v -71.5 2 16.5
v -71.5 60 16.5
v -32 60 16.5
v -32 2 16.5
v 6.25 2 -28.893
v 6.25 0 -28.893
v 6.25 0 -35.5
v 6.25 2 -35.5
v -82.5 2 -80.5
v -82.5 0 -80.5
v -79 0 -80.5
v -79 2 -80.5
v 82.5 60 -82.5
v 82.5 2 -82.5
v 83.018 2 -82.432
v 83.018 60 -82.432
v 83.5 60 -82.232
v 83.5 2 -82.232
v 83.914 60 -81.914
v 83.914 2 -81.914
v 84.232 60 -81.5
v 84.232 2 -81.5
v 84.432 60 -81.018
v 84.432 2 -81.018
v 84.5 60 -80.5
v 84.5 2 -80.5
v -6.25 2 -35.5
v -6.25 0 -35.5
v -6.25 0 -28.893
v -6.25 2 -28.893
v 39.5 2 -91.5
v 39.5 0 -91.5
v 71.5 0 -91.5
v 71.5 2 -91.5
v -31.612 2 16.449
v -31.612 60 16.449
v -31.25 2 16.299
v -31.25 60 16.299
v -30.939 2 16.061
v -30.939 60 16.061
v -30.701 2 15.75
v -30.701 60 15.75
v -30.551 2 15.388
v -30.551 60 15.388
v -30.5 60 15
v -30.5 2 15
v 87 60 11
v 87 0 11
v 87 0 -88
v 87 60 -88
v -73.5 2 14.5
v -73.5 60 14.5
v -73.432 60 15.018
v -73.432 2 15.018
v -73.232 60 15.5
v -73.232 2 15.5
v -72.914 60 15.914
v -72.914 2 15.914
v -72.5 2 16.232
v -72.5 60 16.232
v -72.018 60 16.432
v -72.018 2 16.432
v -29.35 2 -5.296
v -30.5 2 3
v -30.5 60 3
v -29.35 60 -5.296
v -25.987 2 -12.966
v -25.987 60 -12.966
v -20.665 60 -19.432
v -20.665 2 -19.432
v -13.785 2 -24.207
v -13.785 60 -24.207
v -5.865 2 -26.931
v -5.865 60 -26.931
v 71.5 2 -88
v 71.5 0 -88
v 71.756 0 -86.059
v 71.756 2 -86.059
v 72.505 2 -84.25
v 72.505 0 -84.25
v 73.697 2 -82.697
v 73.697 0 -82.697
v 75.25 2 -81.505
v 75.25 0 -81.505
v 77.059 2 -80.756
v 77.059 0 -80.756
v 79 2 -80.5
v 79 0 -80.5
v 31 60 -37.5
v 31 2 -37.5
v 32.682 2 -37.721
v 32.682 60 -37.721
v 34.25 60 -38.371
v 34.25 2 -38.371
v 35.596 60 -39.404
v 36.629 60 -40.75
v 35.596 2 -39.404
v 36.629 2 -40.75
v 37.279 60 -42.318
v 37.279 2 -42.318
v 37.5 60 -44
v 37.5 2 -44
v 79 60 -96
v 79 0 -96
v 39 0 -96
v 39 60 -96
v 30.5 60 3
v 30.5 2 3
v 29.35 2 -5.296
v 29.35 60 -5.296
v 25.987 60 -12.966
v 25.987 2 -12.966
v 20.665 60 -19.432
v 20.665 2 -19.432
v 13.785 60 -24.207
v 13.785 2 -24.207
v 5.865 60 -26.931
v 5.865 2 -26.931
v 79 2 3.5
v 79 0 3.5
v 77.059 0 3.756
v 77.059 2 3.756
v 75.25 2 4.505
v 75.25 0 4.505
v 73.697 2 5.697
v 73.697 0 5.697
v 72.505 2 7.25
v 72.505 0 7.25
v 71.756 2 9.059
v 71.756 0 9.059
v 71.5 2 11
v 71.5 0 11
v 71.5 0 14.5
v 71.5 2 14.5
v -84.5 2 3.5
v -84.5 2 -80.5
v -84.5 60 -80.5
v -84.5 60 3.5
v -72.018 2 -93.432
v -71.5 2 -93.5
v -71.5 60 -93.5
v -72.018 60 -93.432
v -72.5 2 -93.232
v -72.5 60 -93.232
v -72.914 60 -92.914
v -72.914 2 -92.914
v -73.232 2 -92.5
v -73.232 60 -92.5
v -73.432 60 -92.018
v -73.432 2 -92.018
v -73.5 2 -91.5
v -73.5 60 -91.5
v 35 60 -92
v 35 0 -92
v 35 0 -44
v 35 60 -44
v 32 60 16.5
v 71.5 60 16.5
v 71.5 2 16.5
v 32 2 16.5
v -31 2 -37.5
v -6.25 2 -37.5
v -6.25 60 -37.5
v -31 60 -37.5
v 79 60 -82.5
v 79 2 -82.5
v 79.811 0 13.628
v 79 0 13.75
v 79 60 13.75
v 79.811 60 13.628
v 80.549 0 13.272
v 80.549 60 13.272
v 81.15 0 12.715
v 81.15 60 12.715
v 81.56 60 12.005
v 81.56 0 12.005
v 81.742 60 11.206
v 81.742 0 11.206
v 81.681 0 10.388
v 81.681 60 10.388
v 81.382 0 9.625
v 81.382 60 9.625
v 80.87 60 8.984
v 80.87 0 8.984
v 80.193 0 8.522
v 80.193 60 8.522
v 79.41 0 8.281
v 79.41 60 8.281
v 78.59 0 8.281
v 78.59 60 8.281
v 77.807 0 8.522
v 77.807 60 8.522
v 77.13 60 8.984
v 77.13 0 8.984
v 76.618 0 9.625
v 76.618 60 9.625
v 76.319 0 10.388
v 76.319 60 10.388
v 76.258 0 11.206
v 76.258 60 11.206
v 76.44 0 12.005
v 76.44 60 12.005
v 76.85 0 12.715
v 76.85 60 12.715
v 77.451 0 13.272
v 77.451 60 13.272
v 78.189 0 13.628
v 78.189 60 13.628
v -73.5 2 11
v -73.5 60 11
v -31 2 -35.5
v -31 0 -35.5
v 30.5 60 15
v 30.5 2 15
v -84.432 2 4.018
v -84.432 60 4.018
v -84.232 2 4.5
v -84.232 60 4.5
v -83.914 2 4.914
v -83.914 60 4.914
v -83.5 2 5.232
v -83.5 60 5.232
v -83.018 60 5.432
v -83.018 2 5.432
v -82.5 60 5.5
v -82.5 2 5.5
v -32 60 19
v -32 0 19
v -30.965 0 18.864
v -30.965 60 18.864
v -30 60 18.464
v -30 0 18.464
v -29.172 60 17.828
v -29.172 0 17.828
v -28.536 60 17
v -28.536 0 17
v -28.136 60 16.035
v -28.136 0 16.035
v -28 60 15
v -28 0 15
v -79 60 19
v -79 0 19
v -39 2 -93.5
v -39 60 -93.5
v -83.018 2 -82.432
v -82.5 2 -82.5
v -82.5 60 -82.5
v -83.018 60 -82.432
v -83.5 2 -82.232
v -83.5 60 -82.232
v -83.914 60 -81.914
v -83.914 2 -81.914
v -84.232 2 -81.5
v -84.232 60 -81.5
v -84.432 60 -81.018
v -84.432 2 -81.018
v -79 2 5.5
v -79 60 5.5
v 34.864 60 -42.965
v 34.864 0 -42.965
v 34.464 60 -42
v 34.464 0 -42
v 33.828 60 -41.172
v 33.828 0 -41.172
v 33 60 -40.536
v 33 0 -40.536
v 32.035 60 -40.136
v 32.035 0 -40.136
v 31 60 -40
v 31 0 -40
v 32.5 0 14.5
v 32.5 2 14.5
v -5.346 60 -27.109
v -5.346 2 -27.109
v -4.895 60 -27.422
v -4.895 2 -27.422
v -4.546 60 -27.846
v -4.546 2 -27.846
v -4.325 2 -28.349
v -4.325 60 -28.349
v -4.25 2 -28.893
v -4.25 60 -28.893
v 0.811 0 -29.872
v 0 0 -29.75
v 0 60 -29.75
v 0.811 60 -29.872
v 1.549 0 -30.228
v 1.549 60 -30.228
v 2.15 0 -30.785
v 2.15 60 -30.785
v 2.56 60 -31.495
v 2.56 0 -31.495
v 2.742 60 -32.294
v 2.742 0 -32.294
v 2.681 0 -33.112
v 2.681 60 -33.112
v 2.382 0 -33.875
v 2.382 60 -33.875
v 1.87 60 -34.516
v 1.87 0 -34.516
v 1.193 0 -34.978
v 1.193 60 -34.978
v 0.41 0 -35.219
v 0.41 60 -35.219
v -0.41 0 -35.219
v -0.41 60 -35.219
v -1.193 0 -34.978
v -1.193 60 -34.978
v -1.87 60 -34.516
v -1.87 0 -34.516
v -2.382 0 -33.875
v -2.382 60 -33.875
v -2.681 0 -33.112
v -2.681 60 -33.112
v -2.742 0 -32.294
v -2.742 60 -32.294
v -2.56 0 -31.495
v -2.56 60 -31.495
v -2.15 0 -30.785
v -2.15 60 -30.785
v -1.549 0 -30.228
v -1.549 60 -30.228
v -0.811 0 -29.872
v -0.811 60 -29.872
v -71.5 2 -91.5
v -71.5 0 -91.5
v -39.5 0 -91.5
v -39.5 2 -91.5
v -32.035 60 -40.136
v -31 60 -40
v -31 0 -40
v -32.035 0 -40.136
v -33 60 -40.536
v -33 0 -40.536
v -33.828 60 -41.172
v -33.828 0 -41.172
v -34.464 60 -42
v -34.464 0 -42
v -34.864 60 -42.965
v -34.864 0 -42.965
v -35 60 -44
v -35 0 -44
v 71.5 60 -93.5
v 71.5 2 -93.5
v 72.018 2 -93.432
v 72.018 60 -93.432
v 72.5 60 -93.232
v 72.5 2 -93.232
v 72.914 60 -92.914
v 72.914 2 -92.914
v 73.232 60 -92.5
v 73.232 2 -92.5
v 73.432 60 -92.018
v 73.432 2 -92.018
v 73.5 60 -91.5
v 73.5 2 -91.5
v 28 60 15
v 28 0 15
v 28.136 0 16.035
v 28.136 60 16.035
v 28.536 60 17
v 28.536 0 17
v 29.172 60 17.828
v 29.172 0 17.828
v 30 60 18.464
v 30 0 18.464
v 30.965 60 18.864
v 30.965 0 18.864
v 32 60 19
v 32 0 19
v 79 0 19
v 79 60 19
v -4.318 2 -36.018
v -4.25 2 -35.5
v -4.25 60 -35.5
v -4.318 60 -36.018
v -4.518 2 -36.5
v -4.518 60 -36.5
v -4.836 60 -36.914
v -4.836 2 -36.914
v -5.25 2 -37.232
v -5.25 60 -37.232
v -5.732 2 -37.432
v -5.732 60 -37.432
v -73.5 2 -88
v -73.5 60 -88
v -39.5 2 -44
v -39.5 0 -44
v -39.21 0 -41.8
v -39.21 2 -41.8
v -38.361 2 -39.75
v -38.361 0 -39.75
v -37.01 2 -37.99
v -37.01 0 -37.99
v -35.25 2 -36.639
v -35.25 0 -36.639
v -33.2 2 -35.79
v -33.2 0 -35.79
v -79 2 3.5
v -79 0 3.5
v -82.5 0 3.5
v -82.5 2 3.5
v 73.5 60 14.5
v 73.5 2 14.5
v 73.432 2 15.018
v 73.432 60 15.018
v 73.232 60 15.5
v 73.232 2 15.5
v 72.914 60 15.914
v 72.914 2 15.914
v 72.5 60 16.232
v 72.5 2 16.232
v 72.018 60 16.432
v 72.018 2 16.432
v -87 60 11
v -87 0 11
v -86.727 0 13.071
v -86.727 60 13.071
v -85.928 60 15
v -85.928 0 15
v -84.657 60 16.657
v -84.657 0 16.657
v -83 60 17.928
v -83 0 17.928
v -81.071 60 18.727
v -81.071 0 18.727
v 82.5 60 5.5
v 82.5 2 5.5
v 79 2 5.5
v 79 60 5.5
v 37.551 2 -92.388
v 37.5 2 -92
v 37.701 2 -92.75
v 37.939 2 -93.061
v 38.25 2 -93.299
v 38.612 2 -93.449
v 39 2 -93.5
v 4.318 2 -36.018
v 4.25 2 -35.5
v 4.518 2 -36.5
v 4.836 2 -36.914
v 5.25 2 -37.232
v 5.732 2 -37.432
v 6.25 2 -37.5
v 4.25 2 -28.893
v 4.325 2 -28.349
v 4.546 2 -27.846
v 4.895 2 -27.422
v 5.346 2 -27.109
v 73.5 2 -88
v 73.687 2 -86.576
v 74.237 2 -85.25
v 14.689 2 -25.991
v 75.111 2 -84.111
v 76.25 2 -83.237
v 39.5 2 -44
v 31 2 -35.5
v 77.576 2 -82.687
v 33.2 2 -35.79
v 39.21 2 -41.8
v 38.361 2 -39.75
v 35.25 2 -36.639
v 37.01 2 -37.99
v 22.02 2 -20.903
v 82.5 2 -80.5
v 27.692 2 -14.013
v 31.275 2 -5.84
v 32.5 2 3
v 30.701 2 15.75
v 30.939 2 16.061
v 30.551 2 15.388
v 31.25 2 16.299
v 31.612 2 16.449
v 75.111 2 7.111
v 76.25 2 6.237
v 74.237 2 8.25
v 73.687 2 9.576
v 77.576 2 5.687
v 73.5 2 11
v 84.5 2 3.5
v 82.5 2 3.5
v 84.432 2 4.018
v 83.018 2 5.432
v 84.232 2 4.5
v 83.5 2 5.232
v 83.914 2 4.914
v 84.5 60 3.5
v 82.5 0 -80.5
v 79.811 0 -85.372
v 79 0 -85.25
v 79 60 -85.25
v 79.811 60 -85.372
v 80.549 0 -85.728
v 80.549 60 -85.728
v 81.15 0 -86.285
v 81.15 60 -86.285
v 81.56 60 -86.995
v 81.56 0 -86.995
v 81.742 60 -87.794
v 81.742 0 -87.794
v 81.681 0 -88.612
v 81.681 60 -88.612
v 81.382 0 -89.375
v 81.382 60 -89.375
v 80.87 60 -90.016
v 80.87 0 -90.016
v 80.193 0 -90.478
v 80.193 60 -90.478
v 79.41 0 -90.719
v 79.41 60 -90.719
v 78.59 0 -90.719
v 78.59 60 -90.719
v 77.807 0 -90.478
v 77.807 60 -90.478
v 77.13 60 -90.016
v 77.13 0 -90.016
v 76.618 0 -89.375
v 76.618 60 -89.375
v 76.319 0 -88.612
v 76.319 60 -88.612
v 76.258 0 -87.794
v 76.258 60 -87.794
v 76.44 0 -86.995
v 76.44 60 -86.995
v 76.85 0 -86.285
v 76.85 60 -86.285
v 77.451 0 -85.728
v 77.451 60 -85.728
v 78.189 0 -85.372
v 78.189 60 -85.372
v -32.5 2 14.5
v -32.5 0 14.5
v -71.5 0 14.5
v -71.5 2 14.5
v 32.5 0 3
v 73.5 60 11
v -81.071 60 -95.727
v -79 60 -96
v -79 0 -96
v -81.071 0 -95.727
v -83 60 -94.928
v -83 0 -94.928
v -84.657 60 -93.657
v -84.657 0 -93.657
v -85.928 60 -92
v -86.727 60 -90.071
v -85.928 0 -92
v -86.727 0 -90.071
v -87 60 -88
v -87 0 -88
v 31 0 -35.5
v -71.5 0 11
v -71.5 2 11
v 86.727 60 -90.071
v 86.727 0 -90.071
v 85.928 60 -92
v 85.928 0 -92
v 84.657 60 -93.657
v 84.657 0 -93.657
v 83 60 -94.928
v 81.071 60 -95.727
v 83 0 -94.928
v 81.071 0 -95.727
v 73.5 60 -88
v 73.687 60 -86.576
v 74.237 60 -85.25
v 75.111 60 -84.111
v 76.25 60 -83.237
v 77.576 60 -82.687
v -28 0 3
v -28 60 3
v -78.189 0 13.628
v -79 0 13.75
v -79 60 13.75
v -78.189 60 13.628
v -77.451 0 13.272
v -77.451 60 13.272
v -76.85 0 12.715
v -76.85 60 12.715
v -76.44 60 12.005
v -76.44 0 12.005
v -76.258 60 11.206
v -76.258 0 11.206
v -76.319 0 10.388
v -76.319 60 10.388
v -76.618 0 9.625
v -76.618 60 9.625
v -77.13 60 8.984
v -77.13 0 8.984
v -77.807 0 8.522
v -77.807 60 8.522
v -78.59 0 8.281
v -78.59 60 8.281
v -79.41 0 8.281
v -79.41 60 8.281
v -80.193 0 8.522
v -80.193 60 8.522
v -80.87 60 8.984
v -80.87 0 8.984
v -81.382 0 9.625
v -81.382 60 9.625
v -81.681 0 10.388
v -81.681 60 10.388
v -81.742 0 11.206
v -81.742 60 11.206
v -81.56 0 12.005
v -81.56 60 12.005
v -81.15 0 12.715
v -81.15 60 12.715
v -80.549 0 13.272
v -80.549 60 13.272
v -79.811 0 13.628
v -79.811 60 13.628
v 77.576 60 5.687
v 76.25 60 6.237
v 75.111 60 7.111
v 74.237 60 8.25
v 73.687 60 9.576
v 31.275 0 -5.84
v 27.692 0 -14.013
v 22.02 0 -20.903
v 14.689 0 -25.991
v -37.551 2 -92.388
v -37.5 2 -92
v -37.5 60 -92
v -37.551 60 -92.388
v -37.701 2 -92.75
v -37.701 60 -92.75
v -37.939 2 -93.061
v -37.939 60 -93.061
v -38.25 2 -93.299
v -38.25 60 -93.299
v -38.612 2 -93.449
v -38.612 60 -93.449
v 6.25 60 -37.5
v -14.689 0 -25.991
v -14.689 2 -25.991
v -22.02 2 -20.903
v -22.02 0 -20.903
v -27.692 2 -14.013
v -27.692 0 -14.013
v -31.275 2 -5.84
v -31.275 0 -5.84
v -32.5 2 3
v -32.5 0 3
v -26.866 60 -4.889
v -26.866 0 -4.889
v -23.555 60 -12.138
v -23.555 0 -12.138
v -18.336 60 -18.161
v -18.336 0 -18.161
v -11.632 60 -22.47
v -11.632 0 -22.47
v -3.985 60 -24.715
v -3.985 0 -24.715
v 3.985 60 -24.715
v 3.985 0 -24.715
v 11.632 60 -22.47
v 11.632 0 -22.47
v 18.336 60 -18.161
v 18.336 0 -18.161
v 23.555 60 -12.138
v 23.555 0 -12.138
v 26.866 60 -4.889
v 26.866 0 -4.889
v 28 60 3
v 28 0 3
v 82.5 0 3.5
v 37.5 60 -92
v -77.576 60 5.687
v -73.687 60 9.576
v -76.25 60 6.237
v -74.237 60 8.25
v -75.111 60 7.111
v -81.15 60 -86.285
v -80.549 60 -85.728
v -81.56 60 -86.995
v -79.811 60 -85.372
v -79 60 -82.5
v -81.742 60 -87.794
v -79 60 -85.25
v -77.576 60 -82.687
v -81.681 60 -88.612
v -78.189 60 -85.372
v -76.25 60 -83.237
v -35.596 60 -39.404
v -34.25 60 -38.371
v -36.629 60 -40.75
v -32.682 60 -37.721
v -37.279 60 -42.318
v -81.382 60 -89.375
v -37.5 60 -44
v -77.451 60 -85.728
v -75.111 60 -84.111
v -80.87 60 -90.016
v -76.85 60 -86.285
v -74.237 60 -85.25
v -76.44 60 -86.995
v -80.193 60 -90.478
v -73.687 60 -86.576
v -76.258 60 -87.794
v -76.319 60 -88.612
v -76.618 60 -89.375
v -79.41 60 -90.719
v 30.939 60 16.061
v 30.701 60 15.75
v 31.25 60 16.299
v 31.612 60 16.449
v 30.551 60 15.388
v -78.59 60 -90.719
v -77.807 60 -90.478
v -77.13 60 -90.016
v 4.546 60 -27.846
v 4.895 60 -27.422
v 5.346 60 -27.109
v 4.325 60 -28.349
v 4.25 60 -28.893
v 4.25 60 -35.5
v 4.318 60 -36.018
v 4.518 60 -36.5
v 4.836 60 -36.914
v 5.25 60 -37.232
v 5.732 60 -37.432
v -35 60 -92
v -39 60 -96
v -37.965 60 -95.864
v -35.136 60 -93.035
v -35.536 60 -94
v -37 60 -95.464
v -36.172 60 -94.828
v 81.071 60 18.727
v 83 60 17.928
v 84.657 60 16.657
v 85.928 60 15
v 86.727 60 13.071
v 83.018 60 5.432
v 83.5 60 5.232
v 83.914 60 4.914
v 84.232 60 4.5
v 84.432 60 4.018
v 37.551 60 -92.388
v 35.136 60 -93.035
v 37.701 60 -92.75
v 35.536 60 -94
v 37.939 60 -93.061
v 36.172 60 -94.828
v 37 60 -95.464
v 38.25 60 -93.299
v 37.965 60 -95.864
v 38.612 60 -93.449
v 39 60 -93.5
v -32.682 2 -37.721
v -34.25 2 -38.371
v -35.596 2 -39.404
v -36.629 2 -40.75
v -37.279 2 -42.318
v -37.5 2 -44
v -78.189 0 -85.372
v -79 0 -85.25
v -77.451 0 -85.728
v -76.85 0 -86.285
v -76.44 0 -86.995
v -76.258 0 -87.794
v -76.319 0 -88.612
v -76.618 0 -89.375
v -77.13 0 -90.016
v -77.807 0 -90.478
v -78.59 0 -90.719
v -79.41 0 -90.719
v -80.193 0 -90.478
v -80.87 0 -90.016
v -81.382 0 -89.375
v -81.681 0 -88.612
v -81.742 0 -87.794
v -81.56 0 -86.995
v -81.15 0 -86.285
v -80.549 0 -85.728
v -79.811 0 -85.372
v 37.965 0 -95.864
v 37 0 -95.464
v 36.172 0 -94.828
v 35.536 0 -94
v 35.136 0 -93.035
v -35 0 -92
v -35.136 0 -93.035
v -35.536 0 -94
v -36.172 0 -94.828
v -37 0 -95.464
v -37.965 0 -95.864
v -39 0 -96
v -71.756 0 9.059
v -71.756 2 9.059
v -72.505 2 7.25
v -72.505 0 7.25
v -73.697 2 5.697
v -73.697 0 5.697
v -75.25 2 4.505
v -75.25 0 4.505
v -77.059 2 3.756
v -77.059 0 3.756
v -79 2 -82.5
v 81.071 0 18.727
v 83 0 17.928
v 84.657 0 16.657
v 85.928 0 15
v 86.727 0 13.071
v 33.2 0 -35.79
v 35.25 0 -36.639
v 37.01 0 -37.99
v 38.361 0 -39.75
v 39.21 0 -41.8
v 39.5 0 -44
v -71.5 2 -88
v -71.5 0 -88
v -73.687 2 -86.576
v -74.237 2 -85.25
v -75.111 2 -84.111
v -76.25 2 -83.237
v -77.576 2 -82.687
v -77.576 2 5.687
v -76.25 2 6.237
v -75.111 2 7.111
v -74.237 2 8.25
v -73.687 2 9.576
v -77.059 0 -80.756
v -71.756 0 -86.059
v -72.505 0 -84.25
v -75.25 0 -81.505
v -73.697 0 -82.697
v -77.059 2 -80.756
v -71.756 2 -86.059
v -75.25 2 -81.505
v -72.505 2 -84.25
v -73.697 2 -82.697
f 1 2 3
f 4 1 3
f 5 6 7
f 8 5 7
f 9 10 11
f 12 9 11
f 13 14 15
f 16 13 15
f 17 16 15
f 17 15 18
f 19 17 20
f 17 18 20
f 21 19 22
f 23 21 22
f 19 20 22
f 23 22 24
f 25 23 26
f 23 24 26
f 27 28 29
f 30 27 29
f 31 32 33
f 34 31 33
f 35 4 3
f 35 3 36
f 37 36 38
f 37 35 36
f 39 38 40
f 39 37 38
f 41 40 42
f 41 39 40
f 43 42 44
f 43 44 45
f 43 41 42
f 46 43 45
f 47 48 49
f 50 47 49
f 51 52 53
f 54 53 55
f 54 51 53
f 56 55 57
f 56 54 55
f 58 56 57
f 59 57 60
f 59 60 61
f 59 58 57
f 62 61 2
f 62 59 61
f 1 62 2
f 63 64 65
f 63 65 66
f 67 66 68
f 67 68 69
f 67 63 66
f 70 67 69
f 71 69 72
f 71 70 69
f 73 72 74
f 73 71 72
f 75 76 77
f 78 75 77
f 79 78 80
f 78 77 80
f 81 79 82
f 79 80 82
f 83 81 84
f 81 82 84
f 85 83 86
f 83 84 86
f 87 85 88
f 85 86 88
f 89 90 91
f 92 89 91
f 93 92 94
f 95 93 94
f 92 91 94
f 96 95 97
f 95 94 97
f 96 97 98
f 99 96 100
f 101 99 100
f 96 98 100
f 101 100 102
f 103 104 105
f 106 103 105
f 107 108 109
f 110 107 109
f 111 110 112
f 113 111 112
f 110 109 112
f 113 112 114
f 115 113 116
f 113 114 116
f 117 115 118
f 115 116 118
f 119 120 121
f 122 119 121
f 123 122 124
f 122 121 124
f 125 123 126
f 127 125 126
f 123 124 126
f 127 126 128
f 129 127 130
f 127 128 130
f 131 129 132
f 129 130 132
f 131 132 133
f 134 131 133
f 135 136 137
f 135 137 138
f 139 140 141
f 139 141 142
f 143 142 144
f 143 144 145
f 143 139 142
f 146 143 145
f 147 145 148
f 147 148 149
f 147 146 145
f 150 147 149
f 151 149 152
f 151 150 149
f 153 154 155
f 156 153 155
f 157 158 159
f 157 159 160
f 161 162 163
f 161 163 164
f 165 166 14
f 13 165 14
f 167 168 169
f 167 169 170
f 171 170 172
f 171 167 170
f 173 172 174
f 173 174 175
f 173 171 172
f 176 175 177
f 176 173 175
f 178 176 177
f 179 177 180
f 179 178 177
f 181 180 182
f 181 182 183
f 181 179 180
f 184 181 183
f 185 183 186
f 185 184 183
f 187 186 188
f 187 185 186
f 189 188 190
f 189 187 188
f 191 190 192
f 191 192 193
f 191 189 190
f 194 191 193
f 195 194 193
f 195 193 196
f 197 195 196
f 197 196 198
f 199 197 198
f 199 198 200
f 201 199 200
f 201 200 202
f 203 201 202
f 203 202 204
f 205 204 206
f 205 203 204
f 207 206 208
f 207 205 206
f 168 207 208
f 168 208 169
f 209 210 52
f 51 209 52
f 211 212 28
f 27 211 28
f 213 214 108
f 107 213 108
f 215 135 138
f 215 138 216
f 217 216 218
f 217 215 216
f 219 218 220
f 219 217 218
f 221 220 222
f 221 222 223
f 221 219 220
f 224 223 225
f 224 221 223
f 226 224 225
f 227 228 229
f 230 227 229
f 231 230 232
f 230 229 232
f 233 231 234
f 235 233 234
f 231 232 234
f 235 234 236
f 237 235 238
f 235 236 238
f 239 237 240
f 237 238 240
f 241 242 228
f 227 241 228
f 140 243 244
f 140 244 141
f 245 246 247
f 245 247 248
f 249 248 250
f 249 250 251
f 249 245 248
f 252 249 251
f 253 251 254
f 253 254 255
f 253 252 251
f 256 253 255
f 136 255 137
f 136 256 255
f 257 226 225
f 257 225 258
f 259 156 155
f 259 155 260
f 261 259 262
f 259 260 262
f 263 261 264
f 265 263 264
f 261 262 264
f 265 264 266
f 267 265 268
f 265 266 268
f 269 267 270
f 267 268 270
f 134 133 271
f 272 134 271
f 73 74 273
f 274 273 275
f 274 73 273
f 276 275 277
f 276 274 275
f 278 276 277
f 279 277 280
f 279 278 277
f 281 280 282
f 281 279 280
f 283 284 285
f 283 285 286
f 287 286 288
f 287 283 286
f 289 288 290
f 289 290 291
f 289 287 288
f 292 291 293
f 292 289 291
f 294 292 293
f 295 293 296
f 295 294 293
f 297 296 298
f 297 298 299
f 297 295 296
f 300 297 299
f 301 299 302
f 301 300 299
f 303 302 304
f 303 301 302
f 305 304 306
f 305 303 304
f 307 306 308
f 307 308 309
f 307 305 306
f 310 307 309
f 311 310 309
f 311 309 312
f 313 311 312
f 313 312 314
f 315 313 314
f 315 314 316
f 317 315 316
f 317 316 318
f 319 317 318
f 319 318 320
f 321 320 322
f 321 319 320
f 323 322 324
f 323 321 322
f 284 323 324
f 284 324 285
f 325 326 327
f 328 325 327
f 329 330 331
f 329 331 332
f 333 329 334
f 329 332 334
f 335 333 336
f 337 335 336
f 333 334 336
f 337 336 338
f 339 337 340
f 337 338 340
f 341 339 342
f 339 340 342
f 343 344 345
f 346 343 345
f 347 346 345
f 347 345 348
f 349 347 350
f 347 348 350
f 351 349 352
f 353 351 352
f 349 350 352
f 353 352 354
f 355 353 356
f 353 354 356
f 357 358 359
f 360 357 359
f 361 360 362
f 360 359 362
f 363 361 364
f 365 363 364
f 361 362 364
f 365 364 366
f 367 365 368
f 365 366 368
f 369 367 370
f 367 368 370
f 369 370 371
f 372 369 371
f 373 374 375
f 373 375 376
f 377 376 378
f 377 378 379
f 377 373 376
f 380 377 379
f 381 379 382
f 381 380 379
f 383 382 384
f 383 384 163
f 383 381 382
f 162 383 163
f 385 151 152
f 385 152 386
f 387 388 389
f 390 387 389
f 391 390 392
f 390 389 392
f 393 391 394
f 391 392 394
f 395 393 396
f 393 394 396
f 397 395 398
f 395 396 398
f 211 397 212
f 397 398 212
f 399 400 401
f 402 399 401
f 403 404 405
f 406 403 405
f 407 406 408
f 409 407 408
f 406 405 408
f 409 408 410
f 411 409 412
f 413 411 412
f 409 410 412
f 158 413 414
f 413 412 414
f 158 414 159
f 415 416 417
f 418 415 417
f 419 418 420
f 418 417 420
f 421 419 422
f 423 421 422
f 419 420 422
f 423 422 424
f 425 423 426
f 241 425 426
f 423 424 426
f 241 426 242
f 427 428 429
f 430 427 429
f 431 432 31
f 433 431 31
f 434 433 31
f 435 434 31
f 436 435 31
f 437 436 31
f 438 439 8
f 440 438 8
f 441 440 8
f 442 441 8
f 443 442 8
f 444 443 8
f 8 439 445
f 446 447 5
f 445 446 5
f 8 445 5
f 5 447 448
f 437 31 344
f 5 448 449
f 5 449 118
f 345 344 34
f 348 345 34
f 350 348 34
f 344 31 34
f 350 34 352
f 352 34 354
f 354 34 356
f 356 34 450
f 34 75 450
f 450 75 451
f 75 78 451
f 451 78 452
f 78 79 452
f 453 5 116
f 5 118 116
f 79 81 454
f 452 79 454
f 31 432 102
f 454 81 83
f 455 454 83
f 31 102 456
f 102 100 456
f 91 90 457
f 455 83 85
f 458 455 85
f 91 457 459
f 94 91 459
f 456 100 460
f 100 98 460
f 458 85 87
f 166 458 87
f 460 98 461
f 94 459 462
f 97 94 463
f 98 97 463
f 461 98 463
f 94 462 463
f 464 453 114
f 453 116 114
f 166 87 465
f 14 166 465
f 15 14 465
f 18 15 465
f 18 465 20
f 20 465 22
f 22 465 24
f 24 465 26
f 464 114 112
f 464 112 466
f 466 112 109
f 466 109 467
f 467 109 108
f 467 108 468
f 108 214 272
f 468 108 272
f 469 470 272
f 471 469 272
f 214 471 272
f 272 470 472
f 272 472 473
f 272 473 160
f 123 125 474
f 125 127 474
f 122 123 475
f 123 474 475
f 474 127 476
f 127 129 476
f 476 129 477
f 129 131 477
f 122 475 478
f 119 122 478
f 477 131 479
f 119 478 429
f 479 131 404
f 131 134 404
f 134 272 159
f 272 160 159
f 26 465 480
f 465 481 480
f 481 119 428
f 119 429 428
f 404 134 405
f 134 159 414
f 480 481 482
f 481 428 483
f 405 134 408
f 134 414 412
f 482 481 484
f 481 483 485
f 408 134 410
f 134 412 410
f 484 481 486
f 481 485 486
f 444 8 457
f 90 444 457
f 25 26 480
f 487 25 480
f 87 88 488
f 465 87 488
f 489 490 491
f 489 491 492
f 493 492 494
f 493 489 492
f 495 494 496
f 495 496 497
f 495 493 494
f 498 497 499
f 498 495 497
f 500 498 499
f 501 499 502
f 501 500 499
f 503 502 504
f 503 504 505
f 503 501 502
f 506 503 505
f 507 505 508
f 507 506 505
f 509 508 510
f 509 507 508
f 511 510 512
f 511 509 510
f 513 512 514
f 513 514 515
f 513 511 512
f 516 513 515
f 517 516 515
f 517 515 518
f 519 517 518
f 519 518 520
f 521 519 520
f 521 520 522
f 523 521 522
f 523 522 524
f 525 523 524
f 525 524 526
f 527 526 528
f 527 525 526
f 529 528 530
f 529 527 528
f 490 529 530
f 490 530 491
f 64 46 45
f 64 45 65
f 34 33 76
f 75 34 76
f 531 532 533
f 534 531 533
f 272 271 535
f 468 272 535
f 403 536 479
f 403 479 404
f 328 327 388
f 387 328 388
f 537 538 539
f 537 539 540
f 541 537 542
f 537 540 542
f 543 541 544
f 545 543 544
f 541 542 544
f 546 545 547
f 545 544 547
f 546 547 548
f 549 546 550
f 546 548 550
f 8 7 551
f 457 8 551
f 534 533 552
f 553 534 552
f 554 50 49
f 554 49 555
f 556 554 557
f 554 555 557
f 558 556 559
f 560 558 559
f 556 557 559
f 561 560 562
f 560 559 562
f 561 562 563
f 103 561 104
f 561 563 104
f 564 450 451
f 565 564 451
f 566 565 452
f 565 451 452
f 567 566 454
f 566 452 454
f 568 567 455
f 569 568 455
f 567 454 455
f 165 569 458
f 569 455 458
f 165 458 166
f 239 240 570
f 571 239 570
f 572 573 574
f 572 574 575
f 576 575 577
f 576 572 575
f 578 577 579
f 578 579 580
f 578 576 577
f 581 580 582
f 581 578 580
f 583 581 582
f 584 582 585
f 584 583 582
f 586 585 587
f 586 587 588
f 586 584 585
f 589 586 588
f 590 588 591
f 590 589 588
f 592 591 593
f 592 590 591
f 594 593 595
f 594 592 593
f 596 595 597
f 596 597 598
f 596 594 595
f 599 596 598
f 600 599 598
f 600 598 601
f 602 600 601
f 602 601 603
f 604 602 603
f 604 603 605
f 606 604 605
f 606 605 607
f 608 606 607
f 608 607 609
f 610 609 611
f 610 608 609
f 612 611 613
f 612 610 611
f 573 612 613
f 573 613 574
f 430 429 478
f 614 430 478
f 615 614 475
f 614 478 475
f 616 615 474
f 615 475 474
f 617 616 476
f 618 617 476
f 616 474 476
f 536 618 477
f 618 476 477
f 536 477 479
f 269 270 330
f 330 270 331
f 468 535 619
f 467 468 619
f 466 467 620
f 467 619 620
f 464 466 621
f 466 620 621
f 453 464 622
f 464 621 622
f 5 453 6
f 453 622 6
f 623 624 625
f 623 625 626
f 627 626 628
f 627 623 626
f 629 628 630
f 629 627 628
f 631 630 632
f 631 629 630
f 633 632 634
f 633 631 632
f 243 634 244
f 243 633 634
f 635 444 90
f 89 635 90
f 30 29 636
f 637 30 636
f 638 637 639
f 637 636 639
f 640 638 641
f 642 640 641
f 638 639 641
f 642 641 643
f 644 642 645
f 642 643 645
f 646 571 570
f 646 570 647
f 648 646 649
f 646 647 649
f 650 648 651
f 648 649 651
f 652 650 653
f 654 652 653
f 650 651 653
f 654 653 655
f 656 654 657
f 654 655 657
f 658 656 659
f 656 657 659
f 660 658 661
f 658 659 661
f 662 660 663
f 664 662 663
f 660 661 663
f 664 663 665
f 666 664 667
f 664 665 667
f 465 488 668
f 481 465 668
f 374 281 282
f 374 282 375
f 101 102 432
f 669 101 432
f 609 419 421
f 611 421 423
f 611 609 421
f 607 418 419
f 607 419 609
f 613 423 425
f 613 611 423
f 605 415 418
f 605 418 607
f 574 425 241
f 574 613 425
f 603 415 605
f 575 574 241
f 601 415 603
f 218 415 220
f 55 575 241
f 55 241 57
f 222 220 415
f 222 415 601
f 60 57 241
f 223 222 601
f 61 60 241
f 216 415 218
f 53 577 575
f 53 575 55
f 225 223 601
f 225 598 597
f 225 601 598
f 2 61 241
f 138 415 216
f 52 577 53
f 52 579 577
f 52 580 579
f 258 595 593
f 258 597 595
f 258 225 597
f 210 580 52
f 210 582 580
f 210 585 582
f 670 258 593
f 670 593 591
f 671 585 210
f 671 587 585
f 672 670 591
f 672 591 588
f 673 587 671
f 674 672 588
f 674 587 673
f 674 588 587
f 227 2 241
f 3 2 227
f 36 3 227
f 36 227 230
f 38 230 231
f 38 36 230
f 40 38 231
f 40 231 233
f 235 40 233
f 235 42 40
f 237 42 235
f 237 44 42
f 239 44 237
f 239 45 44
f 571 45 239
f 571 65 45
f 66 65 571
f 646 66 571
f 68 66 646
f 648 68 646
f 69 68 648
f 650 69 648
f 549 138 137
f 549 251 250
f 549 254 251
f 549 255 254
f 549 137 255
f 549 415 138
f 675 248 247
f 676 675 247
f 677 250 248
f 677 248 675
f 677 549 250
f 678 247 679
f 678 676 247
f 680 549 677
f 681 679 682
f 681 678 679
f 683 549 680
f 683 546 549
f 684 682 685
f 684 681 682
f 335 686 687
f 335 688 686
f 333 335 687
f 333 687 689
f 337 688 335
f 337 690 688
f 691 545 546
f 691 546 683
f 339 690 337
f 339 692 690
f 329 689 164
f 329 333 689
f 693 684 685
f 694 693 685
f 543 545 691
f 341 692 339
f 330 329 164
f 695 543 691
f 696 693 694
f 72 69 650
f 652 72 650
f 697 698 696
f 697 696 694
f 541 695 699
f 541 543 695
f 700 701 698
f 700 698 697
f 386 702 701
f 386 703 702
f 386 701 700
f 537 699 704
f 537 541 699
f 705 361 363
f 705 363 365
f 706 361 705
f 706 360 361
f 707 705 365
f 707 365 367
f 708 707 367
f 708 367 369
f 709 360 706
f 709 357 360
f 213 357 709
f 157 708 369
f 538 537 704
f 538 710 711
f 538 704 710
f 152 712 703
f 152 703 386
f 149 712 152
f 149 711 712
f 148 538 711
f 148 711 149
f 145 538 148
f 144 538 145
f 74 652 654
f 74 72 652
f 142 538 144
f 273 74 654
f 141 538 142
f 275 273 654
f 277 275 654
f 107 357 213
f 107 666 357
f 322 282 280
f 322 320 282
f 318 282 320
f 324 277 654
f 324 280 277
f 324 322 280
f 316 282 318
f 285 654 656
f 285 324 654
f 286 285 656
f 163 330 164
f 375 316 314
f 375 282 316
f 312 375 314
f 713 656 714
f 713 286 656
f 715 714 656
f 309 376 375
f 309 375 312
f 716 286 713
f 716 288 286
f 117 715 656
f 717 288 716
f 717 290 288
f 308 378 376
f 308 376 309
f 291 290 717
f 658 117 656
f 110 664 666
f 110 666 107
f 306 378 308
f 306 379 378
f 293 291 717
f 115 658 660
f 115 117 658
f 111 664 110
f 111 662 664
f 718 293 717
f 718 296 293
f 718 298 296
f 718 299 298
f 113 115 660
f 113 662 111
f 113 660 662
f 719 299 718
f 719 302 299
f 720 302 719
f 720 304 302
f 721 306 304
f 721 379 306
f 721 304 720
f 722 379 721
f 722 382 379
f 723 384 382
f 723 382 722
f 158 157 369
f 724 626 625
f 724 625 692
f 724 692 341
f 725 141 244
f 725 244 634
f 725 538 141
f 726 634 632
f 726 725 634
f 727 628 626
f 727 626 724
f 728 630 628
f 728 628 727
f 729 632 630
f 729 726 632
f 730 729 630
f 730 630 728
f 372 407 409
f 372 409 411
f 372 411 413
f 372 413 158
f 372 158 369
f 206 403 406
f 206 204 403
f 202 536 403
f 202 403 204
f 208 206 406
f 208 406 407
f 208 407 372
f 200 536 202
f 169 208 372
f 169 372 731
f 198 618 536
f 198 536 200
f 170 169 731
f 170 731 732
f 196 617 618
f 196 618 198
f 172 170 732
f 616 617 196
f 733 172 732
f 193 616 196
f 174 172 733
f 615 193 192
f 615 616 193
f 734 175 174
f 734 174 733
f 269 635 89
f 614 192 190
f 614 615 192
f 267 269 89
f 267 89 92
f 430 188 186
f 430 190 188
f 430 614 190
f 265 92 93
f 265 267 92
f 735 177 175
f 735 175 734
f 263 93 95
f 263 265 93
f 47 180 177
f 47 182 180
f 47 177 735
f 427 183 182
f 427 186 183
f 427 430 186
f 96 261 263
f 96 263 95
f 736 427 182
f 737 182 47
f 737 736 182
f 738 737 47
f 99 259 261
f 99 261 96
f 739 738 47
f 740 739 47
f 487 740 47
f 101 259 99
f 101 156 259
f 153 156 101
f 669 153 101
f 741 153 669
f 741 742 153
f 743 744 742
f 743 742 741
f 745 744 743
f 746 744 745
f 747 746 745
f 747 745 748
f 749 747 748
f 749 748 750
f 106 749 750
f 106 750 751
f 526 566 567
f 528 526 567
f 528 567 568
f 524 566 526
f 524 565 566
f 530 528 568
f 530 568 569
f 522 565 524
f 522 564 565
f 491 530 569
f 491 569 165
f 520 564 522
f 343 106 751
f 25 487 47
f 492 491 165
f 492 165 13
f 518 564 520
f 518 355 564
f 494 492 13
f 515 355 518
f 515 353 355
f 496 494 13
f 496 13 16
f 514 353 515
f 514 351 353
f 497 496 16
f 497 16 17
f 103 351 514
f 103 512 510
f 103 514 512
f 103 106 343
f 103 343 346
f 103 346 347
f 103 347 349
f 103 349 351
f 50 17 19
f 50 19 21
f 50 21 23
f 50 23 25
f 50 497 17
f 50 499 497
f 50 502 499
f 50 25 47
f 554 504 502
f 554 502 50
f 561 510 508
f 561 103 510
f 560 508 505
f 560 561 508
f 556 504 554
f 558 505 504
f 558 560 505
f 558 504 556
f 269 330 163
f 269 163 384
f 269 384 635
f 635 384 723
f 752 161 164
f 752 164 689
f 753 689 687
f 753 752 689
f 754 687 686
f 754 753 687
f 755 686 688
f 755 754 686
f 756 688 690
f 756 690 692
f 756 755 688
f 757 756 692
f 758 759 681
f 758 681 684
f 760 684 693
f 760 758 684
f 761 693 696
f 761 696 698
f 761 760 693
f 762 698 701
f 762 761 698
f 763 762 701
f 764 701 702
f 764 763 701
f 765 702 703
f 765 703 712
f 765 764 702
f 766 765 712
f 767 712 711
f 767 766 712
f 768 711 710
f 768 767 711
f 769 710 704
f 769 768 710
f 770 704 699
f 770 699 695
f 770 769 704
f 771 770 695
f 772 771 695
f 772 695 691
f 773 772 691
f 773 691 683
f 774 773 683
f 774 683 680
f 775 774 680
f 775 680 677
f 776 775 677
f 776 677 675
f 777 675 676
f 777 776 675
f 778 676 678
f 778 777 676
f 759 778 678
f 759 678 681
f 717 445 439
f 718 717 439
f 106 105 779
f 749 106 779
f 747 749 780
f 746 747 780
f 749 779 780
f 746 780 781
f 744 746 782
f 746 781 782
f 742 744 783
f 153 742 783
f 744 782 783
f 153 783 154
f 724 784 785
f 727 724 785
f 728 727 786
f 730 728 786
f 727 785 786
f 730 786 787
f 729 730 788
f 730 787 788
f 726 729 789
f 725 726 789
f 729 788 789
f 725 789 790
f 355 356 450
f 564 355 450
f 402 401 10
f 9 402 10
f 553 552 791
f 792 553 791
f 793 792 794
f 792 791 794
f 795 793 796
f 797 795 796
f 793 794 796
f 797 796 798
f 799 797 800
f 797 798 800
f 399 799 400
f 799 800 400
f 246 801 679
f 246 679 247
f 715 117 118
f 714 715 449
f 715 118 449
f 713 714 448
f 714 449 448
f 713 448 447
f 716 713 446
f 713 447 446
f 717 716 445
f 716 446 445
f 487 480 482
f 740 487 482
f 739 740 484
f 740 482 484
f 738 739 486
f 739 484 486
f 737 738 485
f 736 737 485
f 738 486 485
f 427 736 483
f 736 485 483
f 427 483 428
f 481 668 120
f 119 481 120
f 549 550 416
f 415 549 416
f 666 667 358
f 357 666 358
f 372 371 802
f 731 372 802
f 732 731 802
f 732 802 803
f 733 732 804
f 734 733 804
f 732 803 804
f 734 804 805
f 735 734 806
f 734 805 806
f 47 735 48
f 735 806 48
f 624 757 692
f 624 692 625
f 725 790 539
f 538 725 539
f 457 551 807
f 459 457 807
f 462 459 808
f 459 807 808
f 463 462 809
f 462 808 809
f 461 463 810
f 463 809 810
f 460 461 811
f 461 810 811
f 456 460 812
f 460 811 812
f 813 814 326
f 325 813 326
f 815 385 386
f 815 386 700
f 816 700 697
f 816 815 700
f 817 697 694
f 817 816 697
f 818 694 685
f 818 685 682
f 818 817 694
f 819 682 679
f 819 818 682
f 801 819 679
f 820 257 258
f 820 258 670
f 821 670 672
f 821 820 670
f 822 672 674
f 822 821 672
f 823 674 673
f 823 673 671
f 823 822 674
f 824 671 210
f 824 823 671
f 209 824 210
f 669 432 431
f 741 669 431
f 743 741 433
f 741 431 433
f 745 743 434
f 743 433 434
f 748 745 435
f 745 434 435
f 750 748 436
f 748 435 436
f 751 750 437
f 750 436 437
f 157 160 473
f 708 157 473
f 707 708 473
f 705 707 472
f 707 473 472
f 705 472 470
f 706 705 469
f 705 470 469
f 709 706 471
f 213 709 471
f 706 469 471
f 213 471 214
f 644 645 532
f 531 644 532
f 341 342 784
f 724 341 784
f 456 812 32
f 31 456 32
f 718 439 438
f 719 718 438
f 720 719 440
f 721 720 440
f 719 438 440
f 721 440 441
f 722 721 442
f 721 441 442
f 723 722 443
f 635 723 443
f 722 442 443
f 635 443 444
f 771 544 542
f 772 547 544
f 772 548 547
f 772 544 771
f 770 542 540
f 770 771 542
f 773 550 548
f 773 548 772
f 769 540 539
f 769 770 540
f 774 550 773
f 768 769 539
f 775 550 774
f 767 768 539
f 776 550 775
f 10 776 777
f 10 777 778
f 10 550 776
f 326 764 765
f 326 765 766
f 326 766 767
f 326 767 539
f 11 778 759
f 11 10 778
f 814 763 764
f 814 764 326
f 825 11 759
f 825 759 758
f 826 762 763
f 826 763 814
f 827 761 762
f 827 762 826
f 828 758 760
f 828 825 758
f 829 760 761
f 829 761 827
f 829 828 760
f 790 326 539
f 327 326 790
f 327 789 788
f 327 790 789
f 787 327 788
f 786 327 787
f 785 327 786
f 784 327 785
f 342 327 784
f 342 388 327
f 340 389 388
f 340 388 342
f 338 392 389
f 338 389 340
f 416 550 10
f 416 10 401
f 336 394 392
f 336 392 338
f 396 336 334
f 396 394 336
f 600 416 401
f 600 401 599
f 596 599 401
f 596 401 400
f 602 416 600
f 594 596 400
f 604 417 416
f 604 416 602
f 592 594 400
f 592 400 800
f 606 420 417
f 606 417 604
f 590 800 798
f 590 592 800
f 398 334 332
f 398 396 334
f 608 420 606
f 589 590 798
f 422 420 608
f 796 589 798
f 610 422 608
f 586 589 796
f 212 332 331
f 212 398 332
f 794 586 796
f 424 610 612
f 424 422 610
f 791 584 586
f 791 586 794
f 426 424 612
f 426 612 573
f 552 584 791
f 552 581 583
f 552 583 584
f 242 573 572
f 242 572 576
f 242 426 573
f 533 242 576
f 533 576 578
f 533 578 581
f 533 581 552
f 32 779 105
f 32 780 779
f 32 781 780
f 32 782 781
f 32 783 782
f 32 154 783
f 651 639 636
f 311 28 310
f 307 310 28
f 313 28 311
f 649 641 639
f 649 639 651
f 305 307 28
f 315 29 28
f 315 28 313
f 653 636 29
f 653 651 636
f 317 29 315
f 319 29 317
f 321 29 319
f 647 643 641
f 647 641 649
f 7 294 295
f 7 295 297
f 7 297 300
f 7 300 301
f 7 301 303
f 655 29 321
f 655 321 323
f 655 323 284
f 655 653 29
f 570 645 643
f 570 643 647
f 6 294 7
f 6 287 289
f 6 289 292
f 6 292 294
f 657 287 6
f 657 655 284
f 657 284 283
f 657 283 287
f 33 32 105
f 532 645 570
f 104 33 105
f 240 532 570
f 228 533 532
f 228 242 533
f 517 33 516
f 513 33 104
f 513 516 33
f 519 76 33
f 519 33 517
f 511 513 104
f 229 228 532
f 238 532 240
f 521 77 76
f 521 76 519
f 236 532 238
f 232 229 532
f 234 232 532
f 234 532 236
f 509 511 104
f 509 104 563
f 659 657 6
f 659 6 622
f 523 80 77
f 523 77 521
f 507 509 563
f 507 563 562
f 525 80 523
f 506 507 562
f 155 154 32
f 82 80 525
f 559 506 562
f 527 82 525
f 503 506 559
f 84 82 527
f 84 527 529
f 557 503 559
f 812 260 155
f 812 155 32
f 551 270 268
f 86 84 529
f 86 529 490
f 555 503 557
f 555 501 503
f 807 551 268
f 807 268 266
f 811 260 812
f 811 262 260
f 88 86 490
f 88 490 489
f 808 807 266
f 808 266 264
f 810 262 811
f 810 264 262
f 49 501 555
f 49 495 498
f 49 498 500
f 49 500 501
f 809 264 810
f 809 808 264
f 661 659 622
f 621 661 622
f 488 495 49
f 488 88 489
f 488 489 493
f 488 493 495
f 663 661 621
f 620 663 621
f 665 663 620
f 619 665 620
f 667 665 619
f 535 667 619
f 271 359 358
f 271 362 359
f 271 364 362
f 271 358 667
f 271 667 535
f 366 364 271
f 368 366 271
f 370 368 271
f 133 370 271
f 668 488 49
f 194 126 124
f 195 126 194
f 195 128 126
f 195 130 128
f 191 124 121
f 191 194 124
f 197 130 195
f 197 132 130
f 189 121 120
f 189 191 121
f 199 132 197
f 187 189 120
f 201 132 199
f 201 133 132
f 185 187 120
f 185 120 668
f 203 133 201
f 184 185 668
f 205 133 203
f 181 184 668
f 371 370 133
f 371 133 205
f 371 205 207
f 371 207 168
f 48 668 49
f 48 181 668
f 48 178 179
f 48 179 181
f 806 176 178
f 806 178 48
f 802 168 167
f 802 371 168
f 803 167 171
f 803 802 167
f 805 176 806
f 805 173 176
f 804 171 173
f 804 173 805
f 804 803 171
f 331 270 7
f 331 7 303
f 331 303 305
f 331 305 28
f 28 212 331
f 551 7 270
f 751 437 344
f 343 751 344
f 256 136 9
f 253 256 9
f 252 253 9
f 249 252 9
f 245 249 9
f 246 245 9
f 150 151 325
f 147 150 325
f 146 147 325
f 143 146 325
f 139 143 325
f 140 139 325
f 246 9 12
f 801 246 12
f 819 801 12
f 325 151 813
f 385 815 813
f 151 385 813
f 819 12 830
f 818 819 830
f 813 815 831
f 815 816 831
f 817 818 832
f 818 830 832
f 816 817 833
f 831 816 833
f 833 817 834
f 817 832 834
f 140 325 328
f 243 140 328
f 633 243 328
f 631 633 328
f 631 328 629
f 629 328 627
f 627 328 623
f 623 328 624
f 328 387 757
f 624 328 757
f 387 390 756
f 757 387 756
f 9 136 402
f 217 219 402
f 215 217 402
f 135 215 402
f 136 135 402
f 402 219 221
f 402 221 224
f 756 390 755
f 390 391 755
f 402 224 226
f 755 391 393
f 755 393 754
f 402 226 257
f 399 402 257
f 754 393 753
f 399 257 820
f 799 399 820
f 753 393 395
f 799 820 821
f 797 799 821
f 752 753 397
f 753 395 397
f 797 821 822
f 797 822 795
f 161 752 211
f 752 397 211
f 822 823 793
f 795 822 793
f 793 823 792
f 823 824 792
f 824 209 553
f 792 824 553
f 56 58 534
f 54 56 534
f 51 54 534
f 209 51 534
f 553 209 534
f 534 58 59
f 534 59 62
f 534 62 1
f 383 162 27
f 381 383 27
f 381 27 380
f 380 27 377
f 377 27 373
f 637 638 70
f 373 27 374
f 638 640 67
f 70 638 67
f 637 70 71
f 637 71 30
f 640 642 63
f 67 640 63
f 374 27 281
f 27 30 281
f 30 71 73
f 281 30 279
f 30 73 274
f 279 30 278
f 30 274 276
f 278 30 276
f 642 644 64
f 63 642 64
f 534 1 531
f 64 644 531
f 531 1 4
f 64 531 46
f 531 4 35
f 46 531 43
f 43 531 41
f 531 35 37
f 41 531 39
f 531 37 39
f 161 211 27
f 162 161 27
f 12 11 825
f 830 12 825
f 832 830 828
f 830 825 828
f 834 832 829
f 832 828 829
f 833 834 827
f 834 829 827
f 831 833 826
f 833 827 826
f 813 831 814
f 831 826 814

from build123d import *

# Parameters (mm, degrees)
SKETCH2_R           = 2.75
BOSS_EXTRUDE1_DEPTH = 60
BOSS_EXTRUDE2_DEPTH = 2


with BuildPart() as part:
    # Sketch2 → Boss-Extrude1 (new body)
    with BuildSketch(Plane(origin=(0, 0, 0), x_dir=(1, 0, 0), z_dir=(0, 1, 0))):
        with BuildLine():
            Line((87, -11), (87, 88))
            ThreePointArc((87, 88), (84.656854249, 93.656854249), (79, 96))
            Line((79, 96), (39, 96))
            ThreePointArc((39, 96), (36.171572875, 94.828427125), (35, 92))
            Line((35, 92), (35, 44))
            ThreePointArc((35, 44), (33.828427125, 41.171572875), (31, 40))
            Line((31, 40), (-31, 40))
            ThreePointArc((-31, 40), (-33.828427125, 41.171572875), (-35, 44))
            Line((-35, 44), (-35, 92))
            ThreePointArc((-35, 92), (-36.171572875, 94.828427125), (-39, 96))
            Line((-39, 96), (-79, 96))
            ThreePointArc((-79, 96), (-84.656854249, 93.656854249), (-87, 88))
            Line((-87, 88), (-87, -11))
            ThreePointArc((-87, -11), (-84.656854249, -16.656854249), (-79, -19))
            Line((-79, -19), (-32, -19))
            ThreePointArc((-32, -19), (-29.171572875, -17.828427125), (-28, -15))
            Line((-28, -15), (-28, -3))
            ThreePointArc((-28, -3), (0, 25), (28, -3))
            Line((28, -3), (28, -15))
            ThreePointArc((28, -15), (29.171572875, -17.828427125), (32, -19))
            Line((32, -19), (79, -19))
            ThreePointArc((79, -19), (84.656854249, -16.656854249), (87, -11))
        make_face()
        with Locations(Location((-79, 88, 0), (0, 0, 270))):
            Circle(SKETCH2_R, mode=Mode.SUBTRACT)
        with Locations(Location((79, 88, 0), (0, 0, 270))):
            Circle(SKETCH2_R, mode=Mode.SUBTRACT)
        with Locations(Location((79, -11, 0), (0, 0, 270))):
            Circle(SKETCH2_R, mode=Mode.SUBTRACT)
        with Locations(Location((-79, -11, 0), (0, 0, 270))):
            Circle(SKETCH2_R, mode=Mode.SUBTRACT)
        with Locations(Location((0, 32.5, 0), (0, 0, 270))):
            Circle(SKETCH2_R, mode=Mode.SUBTRACT)
        with BuildLine():
            Line((-39, 93.5), (-71.5, 93.5))
            ThreePointArc((-71.5, 93.5), (-72.914213562, 92.914213562), (-73.5, 91.5))
            Line((-73.5, 91.5), (-73.5, 88))
            ThreePointArc((-73.5, 88), (-75.110912703, 84.110912703), (-79, 82.5))
            Line((-79, 82.5), (-82.5, 82.5))
            ThreePointArc((-82.5, 82.5), (-83.914213562, 81.914213562), (-84.5, 80.5))
            Line((-84.5, 80.5), (-84.5, -3.5))
            ThreePointArc((-84.5, -3.5), (-83.914213562, -4.914213562), (-82.5, -5.5))
            Line((-82.5, -5.5), (-79, -5.5))
            ThreePointArc((-79, -5.5), (-75.110912703, -7.110912703), (-73.5, -11))
            Line((-73.5, -11), (-73.5, -14.5))
            ThreePointArc((-73.5, -14.5), (-72.914213562, -15.914213562), (-71.5, -16.5))
            Line((-71.5, -16.5), (-32, -16.5))
            ThreePointArc((-32, -16.5), (-30.939339828, -16.060660172), (-30.5, -15))
            Line((-30.5, -15), (-30.5, -3))
            ThreePointArc((-30.5, -3), (-23.549354883, 16.382411734), (-5.865384615, 26.930707698))
            ThreePointArc((-5.865384615, 26.930707698), (-4.705780008, 27.622399237), (-4.25, 28.893377055))
            Line((-4.25, 28.893377055), (-4.25, 35.5))
            ThreePointArc((-4.25, 35.5), (-4.835786438, 36.914213562), (-6.25, 37.5))
            Line((-6.25, 37.5), (-31, 37.5))
            ThreePointArc((-31, 37.5), (-35.596194078, 39.403805922), (-37.5, 44))
            Line((-37.5, 44), (-37.5, 92))
            ThreePointArc((-37.5, 92), (-37.939339828, 93.060660172), (-39, 93.5))
        make_face(mode=Mode.SUBTRACT)
        with BuildLine():
            Line((30.5, -15), (30.5, -3))
            ThreePointArc((30.5, -3), (23.549354883, 16.382411734), (5.865384615, 26.930707698))
            ThreePointArc((5.865384615, 26.930707698), (4.705780008, 27.622399237), (4.25, 28.893377055))
            Line((4.25, 28.893377055), (4.25, 35.5))
            ThreePointArc((4.25, 35.5), (4.835786438, 36.914213562), (6.25, 37.5))
            Line((6.25, 37.5), (31, 37.5))
            ThreePointArc((31, 37.5), (35.596194078, 39.403805922), (37.5, 44))
            Line((37.5, 44), (37.5, 92))
            ThreePointArc((37.5, 92), (37.939339828, 93.060660172), (39, 93.5))
            Line((39, 93.5), (71.5, 93.5))
            ThreePointArc((71.5, 93.5), (72.914213562, 92.914213562), (73.5, 91.5))
            Line((73.5, 91.5), (73.5, 88))
            ThreePointArc((73.5, 88), (75.110912703, 84.110912703), (79, 82.5))
            Line((79, 82.5), (82.5, 82.5))
            ThreePointArc((82.5, 82.5), (83.914213562, 81.914213562), (84.5, 80.5))
            Line((84.5, 80.5), (84.5, -3.5))
            ThreePointArc((84.5, -3.5), (83.914213562, -4.914213562), (82.5, -5.5))
            Line((82.5, -5.5), (79, -5.5))
            ThreePointArc((79, -5.5), (75.110912703, -7.110912703), (73.5, -11))
            Line((73.5, -11), (73.5, -14.5))
            ThreePointArc((73.5, -14.5), (72.914213562, -15.914213562), (71.5, -16.5))
            Line((71.5, -16.5), (32, -16.5))
            ThreePointArc((32, -16.5), (30.939339828, -16.060660172), (30.5, -15))
        make_face(mode=Mode.SUBTRACT)
    extrude(amount=BOSS_EXTRUDE1_DEPTH)

    # Sketch3 → Boss-Extrude2 (add)
    # profile 1 of 2: a face of its own
    with BuildSketch(Plane.XZ):
        with BuildLine():
            Line((-37.5, -92), (-37.5, -44))
            ThreePointArc((-37.5, -44), (-35.596194078, -39.403805922), (-31, -37.5))
            Line((-31, -37.5), (-6.25, -37.5))
            ThreePointArc((-6.25, -37.5), (-4.835786438, -36.914213562), (-4.25, -35.5))
            Line((-4.25, -35.5), (-4.25, -28.893377055))
            ThreePointArc((-4.25, -28.893377055), (-4.705780008, -27.622399237), (-5.865384615, -26.930707698))
            ThreePointArc((-5.865384615, -26.930707698), (-23.549354883, -16.382411734), (-30.5, 3))
            Line((-30.5, 3), (-30.5, 15))
            ThreePointArc((-30.5, 15), (-30.939339828, 16.060660172), (-32, 16.5))
            Line((-32, 16.5), (-71.5, 16.5))
            ThreePointArc((-71.5, 16.5), (-72.914213562, 15.914213562), (-73.5, 14.5))
            Line((-73.5, 14.5), (-73.5, 11))
            ThreePointArc((-73.5, 11), (-75.110912703, 7.110912703), (-79, 5.5))
            Line((-79, 5.5), (-82.5, 5.5))
            ThreePointArc((-82.5, 5.5), (-83.914213562, 4.914213562), (-84.5, 3.5))
            Line((-84.5, 3.5), (-84.5, -80.5))
            ThreePointArc((-84.5, -80.5), (-83.914213562, -81.914213562), (-82.5, -82.5))
            Line((-82.5, -82.5), (-79, -82.5))
            ThreePointArc((-79, -82.5), (-75.110912703, -84.110912703), (-73.5, -88))
            Line((-73.5, -88), (-73.5, -91.5))
            ThreePointArc((-73.5, -91.5), (-72.914213562, -92.914213562), (-71.5, -93.5))
            Line((-71.5, -93.5), (-39, -93.5))
            ThreePointArc((-39, -93.5), (-37.939339828, -93.060660172), (-37.5, -92))
        make_face()
        with BuildLine():
            Line((-39.5, -91.5), (-39.5, -44))
            ThreePointArc((-39.5, -44), (-37.01040764, -37.98959236), (-31, -35.5))
            Line((-31, -35.5), (-6.25, -35.5))
            Line((-6.25, -35.5), (-6.25, -28.893377055))
            ThreePointArc((-6.25, -28.893377055), (-25.093574875, -17.653389552), (-32.5, 3))
            Line((-32.5, 3), (-32.5, 14.5))
            Line((-32.5, 14.5), (-71.5, 14.5))
            Line((-71.5, 14.5), (-71.5, 11))
            ThreePointArc((-71.5, 11), (-73.696699141, 5.696699141), (-79, 3.5))
            Line((-79, 3.5), (-82.5, 3.5))
            Line((-82.5, 3.5), (-82.5, -80.5))
            Line((-82.5, -80.5), (-79, -80.5))
            ThreePointArc((-79, -80.5), (-73.696699141, -82.696699141), (-71.5, -88))
            Line((-71.5, -88), (-71.5, -91.5))
            Line((-71.5, -91.5), (-39.5, -91.5))
        make_face(mode=Mode.SUBTRACT)
    # profile 2 of 2: a face of its own
    with BuildSketch(Plane.XZ):
        with BuildLine():
            Line((30.5, 15), (30.5, 3))
            ThreePointArc((30.5, 3), (23.549354883, -16.382411734), (5.865384615, -26.930707698))
            ThreePointArc((5.865384615, -26.930707698), (4.705780008, -27.622399237), (4.25, -28.893377055))
            Line((4.25, -28.893377055), (4.25, -35.5))
            ThreePointArc((4.25, -35.5), (4.835786438, -36.914213562), (6.25, -37.5))
            Line((6.25, -37.5), (31, -37.5))
            ThreePointArc((31, -37.5), (35.596194078, -39.403805922), (37.5, -44))
            Line((37.5, -44), (37.5, -92))
            ThreePointArc((37.5, -92), (37.939339828, -93.060660172), (39, -93.5))
            Line((39, -93.5), (71.5, -93.5))
            ThreePointArc((71.5, -93.5), (72.914213562, -92.914213562), (73.5, -91.5))
            Line((73.5, -91.5), (73.5, -88))
            ThreePointArc((73.5, -88), (75.110912703, -84.110912703), (79, -82.5))
            Line((79, -82.5), (82.5, -82.5))
            ThreePointArc((82.5, -82.5), (83.914213562, -81.914213562), (84.5, -80.5))
            Line((84.5, -80.5), (84.5, 3.5))
            ThreePointArc((84.5, 3.5), (83.914213562, 4.914213562), (82.5, 5.5))
            Line((82.5, 5.5), (79, 5.5))
            ThreePointArc((79, 5.5), (75.110912703, 7.110912703), (73.5, 11))
            Line((73.5, 11), (73.5, 14.5))
            ThreePointArc((73.5, 14.5), (72.914213562, 15.914213562), (71.5, 16.5))
            Line((71.5, 16.5), (32, 16.5))
            ThreePointArc((32, 16.5), (30.939339828, 16.060660172), (30.5, 15))
        make_face()
        with BuildLine():
            Line((71.5, 14.5), (32.5, 14.5))
            Line((32.5, 14.5), (32.5, 3))
            ThreePointArc((32.5, 3), (25.093574875, -17.653389552), (6.25, -28.893377055))
            Line((6.25, -28.893377055), (6.25, -35.5))
            Line((6.25, -35.5), (31, -35.5))
            ThreePointArc((31, -35.5), (37.01040764, -37.98959236), (39.5, -44))
            Line((39.5, -44), (39.5, -91.5))
            Line((39.5, -91.5), (71.5, -91.5))
            Line((71.5, -91.5), (71.5, -88))
            ThreePointArc((71.5, -88), (73.696699141, -82.696699141), (79, -80.5))
            Line((79, -80.5), (82.5, -80.5))
            Line((82.5, -80.5), (82.5, 3.5))
            Line((82.5, 3.5), (79, 3.5))
            ThreePointArc((79, 3.5), (73.696699141, 5.696699141), (71.5, 11))
            Line((71.5, 11), (71.5, 14.5))
        make_face(mode=Mode.SUBTRACT)
    extrude(amount=-BOSS_EXTRUDE2_DEPTH)


solid = part.part
